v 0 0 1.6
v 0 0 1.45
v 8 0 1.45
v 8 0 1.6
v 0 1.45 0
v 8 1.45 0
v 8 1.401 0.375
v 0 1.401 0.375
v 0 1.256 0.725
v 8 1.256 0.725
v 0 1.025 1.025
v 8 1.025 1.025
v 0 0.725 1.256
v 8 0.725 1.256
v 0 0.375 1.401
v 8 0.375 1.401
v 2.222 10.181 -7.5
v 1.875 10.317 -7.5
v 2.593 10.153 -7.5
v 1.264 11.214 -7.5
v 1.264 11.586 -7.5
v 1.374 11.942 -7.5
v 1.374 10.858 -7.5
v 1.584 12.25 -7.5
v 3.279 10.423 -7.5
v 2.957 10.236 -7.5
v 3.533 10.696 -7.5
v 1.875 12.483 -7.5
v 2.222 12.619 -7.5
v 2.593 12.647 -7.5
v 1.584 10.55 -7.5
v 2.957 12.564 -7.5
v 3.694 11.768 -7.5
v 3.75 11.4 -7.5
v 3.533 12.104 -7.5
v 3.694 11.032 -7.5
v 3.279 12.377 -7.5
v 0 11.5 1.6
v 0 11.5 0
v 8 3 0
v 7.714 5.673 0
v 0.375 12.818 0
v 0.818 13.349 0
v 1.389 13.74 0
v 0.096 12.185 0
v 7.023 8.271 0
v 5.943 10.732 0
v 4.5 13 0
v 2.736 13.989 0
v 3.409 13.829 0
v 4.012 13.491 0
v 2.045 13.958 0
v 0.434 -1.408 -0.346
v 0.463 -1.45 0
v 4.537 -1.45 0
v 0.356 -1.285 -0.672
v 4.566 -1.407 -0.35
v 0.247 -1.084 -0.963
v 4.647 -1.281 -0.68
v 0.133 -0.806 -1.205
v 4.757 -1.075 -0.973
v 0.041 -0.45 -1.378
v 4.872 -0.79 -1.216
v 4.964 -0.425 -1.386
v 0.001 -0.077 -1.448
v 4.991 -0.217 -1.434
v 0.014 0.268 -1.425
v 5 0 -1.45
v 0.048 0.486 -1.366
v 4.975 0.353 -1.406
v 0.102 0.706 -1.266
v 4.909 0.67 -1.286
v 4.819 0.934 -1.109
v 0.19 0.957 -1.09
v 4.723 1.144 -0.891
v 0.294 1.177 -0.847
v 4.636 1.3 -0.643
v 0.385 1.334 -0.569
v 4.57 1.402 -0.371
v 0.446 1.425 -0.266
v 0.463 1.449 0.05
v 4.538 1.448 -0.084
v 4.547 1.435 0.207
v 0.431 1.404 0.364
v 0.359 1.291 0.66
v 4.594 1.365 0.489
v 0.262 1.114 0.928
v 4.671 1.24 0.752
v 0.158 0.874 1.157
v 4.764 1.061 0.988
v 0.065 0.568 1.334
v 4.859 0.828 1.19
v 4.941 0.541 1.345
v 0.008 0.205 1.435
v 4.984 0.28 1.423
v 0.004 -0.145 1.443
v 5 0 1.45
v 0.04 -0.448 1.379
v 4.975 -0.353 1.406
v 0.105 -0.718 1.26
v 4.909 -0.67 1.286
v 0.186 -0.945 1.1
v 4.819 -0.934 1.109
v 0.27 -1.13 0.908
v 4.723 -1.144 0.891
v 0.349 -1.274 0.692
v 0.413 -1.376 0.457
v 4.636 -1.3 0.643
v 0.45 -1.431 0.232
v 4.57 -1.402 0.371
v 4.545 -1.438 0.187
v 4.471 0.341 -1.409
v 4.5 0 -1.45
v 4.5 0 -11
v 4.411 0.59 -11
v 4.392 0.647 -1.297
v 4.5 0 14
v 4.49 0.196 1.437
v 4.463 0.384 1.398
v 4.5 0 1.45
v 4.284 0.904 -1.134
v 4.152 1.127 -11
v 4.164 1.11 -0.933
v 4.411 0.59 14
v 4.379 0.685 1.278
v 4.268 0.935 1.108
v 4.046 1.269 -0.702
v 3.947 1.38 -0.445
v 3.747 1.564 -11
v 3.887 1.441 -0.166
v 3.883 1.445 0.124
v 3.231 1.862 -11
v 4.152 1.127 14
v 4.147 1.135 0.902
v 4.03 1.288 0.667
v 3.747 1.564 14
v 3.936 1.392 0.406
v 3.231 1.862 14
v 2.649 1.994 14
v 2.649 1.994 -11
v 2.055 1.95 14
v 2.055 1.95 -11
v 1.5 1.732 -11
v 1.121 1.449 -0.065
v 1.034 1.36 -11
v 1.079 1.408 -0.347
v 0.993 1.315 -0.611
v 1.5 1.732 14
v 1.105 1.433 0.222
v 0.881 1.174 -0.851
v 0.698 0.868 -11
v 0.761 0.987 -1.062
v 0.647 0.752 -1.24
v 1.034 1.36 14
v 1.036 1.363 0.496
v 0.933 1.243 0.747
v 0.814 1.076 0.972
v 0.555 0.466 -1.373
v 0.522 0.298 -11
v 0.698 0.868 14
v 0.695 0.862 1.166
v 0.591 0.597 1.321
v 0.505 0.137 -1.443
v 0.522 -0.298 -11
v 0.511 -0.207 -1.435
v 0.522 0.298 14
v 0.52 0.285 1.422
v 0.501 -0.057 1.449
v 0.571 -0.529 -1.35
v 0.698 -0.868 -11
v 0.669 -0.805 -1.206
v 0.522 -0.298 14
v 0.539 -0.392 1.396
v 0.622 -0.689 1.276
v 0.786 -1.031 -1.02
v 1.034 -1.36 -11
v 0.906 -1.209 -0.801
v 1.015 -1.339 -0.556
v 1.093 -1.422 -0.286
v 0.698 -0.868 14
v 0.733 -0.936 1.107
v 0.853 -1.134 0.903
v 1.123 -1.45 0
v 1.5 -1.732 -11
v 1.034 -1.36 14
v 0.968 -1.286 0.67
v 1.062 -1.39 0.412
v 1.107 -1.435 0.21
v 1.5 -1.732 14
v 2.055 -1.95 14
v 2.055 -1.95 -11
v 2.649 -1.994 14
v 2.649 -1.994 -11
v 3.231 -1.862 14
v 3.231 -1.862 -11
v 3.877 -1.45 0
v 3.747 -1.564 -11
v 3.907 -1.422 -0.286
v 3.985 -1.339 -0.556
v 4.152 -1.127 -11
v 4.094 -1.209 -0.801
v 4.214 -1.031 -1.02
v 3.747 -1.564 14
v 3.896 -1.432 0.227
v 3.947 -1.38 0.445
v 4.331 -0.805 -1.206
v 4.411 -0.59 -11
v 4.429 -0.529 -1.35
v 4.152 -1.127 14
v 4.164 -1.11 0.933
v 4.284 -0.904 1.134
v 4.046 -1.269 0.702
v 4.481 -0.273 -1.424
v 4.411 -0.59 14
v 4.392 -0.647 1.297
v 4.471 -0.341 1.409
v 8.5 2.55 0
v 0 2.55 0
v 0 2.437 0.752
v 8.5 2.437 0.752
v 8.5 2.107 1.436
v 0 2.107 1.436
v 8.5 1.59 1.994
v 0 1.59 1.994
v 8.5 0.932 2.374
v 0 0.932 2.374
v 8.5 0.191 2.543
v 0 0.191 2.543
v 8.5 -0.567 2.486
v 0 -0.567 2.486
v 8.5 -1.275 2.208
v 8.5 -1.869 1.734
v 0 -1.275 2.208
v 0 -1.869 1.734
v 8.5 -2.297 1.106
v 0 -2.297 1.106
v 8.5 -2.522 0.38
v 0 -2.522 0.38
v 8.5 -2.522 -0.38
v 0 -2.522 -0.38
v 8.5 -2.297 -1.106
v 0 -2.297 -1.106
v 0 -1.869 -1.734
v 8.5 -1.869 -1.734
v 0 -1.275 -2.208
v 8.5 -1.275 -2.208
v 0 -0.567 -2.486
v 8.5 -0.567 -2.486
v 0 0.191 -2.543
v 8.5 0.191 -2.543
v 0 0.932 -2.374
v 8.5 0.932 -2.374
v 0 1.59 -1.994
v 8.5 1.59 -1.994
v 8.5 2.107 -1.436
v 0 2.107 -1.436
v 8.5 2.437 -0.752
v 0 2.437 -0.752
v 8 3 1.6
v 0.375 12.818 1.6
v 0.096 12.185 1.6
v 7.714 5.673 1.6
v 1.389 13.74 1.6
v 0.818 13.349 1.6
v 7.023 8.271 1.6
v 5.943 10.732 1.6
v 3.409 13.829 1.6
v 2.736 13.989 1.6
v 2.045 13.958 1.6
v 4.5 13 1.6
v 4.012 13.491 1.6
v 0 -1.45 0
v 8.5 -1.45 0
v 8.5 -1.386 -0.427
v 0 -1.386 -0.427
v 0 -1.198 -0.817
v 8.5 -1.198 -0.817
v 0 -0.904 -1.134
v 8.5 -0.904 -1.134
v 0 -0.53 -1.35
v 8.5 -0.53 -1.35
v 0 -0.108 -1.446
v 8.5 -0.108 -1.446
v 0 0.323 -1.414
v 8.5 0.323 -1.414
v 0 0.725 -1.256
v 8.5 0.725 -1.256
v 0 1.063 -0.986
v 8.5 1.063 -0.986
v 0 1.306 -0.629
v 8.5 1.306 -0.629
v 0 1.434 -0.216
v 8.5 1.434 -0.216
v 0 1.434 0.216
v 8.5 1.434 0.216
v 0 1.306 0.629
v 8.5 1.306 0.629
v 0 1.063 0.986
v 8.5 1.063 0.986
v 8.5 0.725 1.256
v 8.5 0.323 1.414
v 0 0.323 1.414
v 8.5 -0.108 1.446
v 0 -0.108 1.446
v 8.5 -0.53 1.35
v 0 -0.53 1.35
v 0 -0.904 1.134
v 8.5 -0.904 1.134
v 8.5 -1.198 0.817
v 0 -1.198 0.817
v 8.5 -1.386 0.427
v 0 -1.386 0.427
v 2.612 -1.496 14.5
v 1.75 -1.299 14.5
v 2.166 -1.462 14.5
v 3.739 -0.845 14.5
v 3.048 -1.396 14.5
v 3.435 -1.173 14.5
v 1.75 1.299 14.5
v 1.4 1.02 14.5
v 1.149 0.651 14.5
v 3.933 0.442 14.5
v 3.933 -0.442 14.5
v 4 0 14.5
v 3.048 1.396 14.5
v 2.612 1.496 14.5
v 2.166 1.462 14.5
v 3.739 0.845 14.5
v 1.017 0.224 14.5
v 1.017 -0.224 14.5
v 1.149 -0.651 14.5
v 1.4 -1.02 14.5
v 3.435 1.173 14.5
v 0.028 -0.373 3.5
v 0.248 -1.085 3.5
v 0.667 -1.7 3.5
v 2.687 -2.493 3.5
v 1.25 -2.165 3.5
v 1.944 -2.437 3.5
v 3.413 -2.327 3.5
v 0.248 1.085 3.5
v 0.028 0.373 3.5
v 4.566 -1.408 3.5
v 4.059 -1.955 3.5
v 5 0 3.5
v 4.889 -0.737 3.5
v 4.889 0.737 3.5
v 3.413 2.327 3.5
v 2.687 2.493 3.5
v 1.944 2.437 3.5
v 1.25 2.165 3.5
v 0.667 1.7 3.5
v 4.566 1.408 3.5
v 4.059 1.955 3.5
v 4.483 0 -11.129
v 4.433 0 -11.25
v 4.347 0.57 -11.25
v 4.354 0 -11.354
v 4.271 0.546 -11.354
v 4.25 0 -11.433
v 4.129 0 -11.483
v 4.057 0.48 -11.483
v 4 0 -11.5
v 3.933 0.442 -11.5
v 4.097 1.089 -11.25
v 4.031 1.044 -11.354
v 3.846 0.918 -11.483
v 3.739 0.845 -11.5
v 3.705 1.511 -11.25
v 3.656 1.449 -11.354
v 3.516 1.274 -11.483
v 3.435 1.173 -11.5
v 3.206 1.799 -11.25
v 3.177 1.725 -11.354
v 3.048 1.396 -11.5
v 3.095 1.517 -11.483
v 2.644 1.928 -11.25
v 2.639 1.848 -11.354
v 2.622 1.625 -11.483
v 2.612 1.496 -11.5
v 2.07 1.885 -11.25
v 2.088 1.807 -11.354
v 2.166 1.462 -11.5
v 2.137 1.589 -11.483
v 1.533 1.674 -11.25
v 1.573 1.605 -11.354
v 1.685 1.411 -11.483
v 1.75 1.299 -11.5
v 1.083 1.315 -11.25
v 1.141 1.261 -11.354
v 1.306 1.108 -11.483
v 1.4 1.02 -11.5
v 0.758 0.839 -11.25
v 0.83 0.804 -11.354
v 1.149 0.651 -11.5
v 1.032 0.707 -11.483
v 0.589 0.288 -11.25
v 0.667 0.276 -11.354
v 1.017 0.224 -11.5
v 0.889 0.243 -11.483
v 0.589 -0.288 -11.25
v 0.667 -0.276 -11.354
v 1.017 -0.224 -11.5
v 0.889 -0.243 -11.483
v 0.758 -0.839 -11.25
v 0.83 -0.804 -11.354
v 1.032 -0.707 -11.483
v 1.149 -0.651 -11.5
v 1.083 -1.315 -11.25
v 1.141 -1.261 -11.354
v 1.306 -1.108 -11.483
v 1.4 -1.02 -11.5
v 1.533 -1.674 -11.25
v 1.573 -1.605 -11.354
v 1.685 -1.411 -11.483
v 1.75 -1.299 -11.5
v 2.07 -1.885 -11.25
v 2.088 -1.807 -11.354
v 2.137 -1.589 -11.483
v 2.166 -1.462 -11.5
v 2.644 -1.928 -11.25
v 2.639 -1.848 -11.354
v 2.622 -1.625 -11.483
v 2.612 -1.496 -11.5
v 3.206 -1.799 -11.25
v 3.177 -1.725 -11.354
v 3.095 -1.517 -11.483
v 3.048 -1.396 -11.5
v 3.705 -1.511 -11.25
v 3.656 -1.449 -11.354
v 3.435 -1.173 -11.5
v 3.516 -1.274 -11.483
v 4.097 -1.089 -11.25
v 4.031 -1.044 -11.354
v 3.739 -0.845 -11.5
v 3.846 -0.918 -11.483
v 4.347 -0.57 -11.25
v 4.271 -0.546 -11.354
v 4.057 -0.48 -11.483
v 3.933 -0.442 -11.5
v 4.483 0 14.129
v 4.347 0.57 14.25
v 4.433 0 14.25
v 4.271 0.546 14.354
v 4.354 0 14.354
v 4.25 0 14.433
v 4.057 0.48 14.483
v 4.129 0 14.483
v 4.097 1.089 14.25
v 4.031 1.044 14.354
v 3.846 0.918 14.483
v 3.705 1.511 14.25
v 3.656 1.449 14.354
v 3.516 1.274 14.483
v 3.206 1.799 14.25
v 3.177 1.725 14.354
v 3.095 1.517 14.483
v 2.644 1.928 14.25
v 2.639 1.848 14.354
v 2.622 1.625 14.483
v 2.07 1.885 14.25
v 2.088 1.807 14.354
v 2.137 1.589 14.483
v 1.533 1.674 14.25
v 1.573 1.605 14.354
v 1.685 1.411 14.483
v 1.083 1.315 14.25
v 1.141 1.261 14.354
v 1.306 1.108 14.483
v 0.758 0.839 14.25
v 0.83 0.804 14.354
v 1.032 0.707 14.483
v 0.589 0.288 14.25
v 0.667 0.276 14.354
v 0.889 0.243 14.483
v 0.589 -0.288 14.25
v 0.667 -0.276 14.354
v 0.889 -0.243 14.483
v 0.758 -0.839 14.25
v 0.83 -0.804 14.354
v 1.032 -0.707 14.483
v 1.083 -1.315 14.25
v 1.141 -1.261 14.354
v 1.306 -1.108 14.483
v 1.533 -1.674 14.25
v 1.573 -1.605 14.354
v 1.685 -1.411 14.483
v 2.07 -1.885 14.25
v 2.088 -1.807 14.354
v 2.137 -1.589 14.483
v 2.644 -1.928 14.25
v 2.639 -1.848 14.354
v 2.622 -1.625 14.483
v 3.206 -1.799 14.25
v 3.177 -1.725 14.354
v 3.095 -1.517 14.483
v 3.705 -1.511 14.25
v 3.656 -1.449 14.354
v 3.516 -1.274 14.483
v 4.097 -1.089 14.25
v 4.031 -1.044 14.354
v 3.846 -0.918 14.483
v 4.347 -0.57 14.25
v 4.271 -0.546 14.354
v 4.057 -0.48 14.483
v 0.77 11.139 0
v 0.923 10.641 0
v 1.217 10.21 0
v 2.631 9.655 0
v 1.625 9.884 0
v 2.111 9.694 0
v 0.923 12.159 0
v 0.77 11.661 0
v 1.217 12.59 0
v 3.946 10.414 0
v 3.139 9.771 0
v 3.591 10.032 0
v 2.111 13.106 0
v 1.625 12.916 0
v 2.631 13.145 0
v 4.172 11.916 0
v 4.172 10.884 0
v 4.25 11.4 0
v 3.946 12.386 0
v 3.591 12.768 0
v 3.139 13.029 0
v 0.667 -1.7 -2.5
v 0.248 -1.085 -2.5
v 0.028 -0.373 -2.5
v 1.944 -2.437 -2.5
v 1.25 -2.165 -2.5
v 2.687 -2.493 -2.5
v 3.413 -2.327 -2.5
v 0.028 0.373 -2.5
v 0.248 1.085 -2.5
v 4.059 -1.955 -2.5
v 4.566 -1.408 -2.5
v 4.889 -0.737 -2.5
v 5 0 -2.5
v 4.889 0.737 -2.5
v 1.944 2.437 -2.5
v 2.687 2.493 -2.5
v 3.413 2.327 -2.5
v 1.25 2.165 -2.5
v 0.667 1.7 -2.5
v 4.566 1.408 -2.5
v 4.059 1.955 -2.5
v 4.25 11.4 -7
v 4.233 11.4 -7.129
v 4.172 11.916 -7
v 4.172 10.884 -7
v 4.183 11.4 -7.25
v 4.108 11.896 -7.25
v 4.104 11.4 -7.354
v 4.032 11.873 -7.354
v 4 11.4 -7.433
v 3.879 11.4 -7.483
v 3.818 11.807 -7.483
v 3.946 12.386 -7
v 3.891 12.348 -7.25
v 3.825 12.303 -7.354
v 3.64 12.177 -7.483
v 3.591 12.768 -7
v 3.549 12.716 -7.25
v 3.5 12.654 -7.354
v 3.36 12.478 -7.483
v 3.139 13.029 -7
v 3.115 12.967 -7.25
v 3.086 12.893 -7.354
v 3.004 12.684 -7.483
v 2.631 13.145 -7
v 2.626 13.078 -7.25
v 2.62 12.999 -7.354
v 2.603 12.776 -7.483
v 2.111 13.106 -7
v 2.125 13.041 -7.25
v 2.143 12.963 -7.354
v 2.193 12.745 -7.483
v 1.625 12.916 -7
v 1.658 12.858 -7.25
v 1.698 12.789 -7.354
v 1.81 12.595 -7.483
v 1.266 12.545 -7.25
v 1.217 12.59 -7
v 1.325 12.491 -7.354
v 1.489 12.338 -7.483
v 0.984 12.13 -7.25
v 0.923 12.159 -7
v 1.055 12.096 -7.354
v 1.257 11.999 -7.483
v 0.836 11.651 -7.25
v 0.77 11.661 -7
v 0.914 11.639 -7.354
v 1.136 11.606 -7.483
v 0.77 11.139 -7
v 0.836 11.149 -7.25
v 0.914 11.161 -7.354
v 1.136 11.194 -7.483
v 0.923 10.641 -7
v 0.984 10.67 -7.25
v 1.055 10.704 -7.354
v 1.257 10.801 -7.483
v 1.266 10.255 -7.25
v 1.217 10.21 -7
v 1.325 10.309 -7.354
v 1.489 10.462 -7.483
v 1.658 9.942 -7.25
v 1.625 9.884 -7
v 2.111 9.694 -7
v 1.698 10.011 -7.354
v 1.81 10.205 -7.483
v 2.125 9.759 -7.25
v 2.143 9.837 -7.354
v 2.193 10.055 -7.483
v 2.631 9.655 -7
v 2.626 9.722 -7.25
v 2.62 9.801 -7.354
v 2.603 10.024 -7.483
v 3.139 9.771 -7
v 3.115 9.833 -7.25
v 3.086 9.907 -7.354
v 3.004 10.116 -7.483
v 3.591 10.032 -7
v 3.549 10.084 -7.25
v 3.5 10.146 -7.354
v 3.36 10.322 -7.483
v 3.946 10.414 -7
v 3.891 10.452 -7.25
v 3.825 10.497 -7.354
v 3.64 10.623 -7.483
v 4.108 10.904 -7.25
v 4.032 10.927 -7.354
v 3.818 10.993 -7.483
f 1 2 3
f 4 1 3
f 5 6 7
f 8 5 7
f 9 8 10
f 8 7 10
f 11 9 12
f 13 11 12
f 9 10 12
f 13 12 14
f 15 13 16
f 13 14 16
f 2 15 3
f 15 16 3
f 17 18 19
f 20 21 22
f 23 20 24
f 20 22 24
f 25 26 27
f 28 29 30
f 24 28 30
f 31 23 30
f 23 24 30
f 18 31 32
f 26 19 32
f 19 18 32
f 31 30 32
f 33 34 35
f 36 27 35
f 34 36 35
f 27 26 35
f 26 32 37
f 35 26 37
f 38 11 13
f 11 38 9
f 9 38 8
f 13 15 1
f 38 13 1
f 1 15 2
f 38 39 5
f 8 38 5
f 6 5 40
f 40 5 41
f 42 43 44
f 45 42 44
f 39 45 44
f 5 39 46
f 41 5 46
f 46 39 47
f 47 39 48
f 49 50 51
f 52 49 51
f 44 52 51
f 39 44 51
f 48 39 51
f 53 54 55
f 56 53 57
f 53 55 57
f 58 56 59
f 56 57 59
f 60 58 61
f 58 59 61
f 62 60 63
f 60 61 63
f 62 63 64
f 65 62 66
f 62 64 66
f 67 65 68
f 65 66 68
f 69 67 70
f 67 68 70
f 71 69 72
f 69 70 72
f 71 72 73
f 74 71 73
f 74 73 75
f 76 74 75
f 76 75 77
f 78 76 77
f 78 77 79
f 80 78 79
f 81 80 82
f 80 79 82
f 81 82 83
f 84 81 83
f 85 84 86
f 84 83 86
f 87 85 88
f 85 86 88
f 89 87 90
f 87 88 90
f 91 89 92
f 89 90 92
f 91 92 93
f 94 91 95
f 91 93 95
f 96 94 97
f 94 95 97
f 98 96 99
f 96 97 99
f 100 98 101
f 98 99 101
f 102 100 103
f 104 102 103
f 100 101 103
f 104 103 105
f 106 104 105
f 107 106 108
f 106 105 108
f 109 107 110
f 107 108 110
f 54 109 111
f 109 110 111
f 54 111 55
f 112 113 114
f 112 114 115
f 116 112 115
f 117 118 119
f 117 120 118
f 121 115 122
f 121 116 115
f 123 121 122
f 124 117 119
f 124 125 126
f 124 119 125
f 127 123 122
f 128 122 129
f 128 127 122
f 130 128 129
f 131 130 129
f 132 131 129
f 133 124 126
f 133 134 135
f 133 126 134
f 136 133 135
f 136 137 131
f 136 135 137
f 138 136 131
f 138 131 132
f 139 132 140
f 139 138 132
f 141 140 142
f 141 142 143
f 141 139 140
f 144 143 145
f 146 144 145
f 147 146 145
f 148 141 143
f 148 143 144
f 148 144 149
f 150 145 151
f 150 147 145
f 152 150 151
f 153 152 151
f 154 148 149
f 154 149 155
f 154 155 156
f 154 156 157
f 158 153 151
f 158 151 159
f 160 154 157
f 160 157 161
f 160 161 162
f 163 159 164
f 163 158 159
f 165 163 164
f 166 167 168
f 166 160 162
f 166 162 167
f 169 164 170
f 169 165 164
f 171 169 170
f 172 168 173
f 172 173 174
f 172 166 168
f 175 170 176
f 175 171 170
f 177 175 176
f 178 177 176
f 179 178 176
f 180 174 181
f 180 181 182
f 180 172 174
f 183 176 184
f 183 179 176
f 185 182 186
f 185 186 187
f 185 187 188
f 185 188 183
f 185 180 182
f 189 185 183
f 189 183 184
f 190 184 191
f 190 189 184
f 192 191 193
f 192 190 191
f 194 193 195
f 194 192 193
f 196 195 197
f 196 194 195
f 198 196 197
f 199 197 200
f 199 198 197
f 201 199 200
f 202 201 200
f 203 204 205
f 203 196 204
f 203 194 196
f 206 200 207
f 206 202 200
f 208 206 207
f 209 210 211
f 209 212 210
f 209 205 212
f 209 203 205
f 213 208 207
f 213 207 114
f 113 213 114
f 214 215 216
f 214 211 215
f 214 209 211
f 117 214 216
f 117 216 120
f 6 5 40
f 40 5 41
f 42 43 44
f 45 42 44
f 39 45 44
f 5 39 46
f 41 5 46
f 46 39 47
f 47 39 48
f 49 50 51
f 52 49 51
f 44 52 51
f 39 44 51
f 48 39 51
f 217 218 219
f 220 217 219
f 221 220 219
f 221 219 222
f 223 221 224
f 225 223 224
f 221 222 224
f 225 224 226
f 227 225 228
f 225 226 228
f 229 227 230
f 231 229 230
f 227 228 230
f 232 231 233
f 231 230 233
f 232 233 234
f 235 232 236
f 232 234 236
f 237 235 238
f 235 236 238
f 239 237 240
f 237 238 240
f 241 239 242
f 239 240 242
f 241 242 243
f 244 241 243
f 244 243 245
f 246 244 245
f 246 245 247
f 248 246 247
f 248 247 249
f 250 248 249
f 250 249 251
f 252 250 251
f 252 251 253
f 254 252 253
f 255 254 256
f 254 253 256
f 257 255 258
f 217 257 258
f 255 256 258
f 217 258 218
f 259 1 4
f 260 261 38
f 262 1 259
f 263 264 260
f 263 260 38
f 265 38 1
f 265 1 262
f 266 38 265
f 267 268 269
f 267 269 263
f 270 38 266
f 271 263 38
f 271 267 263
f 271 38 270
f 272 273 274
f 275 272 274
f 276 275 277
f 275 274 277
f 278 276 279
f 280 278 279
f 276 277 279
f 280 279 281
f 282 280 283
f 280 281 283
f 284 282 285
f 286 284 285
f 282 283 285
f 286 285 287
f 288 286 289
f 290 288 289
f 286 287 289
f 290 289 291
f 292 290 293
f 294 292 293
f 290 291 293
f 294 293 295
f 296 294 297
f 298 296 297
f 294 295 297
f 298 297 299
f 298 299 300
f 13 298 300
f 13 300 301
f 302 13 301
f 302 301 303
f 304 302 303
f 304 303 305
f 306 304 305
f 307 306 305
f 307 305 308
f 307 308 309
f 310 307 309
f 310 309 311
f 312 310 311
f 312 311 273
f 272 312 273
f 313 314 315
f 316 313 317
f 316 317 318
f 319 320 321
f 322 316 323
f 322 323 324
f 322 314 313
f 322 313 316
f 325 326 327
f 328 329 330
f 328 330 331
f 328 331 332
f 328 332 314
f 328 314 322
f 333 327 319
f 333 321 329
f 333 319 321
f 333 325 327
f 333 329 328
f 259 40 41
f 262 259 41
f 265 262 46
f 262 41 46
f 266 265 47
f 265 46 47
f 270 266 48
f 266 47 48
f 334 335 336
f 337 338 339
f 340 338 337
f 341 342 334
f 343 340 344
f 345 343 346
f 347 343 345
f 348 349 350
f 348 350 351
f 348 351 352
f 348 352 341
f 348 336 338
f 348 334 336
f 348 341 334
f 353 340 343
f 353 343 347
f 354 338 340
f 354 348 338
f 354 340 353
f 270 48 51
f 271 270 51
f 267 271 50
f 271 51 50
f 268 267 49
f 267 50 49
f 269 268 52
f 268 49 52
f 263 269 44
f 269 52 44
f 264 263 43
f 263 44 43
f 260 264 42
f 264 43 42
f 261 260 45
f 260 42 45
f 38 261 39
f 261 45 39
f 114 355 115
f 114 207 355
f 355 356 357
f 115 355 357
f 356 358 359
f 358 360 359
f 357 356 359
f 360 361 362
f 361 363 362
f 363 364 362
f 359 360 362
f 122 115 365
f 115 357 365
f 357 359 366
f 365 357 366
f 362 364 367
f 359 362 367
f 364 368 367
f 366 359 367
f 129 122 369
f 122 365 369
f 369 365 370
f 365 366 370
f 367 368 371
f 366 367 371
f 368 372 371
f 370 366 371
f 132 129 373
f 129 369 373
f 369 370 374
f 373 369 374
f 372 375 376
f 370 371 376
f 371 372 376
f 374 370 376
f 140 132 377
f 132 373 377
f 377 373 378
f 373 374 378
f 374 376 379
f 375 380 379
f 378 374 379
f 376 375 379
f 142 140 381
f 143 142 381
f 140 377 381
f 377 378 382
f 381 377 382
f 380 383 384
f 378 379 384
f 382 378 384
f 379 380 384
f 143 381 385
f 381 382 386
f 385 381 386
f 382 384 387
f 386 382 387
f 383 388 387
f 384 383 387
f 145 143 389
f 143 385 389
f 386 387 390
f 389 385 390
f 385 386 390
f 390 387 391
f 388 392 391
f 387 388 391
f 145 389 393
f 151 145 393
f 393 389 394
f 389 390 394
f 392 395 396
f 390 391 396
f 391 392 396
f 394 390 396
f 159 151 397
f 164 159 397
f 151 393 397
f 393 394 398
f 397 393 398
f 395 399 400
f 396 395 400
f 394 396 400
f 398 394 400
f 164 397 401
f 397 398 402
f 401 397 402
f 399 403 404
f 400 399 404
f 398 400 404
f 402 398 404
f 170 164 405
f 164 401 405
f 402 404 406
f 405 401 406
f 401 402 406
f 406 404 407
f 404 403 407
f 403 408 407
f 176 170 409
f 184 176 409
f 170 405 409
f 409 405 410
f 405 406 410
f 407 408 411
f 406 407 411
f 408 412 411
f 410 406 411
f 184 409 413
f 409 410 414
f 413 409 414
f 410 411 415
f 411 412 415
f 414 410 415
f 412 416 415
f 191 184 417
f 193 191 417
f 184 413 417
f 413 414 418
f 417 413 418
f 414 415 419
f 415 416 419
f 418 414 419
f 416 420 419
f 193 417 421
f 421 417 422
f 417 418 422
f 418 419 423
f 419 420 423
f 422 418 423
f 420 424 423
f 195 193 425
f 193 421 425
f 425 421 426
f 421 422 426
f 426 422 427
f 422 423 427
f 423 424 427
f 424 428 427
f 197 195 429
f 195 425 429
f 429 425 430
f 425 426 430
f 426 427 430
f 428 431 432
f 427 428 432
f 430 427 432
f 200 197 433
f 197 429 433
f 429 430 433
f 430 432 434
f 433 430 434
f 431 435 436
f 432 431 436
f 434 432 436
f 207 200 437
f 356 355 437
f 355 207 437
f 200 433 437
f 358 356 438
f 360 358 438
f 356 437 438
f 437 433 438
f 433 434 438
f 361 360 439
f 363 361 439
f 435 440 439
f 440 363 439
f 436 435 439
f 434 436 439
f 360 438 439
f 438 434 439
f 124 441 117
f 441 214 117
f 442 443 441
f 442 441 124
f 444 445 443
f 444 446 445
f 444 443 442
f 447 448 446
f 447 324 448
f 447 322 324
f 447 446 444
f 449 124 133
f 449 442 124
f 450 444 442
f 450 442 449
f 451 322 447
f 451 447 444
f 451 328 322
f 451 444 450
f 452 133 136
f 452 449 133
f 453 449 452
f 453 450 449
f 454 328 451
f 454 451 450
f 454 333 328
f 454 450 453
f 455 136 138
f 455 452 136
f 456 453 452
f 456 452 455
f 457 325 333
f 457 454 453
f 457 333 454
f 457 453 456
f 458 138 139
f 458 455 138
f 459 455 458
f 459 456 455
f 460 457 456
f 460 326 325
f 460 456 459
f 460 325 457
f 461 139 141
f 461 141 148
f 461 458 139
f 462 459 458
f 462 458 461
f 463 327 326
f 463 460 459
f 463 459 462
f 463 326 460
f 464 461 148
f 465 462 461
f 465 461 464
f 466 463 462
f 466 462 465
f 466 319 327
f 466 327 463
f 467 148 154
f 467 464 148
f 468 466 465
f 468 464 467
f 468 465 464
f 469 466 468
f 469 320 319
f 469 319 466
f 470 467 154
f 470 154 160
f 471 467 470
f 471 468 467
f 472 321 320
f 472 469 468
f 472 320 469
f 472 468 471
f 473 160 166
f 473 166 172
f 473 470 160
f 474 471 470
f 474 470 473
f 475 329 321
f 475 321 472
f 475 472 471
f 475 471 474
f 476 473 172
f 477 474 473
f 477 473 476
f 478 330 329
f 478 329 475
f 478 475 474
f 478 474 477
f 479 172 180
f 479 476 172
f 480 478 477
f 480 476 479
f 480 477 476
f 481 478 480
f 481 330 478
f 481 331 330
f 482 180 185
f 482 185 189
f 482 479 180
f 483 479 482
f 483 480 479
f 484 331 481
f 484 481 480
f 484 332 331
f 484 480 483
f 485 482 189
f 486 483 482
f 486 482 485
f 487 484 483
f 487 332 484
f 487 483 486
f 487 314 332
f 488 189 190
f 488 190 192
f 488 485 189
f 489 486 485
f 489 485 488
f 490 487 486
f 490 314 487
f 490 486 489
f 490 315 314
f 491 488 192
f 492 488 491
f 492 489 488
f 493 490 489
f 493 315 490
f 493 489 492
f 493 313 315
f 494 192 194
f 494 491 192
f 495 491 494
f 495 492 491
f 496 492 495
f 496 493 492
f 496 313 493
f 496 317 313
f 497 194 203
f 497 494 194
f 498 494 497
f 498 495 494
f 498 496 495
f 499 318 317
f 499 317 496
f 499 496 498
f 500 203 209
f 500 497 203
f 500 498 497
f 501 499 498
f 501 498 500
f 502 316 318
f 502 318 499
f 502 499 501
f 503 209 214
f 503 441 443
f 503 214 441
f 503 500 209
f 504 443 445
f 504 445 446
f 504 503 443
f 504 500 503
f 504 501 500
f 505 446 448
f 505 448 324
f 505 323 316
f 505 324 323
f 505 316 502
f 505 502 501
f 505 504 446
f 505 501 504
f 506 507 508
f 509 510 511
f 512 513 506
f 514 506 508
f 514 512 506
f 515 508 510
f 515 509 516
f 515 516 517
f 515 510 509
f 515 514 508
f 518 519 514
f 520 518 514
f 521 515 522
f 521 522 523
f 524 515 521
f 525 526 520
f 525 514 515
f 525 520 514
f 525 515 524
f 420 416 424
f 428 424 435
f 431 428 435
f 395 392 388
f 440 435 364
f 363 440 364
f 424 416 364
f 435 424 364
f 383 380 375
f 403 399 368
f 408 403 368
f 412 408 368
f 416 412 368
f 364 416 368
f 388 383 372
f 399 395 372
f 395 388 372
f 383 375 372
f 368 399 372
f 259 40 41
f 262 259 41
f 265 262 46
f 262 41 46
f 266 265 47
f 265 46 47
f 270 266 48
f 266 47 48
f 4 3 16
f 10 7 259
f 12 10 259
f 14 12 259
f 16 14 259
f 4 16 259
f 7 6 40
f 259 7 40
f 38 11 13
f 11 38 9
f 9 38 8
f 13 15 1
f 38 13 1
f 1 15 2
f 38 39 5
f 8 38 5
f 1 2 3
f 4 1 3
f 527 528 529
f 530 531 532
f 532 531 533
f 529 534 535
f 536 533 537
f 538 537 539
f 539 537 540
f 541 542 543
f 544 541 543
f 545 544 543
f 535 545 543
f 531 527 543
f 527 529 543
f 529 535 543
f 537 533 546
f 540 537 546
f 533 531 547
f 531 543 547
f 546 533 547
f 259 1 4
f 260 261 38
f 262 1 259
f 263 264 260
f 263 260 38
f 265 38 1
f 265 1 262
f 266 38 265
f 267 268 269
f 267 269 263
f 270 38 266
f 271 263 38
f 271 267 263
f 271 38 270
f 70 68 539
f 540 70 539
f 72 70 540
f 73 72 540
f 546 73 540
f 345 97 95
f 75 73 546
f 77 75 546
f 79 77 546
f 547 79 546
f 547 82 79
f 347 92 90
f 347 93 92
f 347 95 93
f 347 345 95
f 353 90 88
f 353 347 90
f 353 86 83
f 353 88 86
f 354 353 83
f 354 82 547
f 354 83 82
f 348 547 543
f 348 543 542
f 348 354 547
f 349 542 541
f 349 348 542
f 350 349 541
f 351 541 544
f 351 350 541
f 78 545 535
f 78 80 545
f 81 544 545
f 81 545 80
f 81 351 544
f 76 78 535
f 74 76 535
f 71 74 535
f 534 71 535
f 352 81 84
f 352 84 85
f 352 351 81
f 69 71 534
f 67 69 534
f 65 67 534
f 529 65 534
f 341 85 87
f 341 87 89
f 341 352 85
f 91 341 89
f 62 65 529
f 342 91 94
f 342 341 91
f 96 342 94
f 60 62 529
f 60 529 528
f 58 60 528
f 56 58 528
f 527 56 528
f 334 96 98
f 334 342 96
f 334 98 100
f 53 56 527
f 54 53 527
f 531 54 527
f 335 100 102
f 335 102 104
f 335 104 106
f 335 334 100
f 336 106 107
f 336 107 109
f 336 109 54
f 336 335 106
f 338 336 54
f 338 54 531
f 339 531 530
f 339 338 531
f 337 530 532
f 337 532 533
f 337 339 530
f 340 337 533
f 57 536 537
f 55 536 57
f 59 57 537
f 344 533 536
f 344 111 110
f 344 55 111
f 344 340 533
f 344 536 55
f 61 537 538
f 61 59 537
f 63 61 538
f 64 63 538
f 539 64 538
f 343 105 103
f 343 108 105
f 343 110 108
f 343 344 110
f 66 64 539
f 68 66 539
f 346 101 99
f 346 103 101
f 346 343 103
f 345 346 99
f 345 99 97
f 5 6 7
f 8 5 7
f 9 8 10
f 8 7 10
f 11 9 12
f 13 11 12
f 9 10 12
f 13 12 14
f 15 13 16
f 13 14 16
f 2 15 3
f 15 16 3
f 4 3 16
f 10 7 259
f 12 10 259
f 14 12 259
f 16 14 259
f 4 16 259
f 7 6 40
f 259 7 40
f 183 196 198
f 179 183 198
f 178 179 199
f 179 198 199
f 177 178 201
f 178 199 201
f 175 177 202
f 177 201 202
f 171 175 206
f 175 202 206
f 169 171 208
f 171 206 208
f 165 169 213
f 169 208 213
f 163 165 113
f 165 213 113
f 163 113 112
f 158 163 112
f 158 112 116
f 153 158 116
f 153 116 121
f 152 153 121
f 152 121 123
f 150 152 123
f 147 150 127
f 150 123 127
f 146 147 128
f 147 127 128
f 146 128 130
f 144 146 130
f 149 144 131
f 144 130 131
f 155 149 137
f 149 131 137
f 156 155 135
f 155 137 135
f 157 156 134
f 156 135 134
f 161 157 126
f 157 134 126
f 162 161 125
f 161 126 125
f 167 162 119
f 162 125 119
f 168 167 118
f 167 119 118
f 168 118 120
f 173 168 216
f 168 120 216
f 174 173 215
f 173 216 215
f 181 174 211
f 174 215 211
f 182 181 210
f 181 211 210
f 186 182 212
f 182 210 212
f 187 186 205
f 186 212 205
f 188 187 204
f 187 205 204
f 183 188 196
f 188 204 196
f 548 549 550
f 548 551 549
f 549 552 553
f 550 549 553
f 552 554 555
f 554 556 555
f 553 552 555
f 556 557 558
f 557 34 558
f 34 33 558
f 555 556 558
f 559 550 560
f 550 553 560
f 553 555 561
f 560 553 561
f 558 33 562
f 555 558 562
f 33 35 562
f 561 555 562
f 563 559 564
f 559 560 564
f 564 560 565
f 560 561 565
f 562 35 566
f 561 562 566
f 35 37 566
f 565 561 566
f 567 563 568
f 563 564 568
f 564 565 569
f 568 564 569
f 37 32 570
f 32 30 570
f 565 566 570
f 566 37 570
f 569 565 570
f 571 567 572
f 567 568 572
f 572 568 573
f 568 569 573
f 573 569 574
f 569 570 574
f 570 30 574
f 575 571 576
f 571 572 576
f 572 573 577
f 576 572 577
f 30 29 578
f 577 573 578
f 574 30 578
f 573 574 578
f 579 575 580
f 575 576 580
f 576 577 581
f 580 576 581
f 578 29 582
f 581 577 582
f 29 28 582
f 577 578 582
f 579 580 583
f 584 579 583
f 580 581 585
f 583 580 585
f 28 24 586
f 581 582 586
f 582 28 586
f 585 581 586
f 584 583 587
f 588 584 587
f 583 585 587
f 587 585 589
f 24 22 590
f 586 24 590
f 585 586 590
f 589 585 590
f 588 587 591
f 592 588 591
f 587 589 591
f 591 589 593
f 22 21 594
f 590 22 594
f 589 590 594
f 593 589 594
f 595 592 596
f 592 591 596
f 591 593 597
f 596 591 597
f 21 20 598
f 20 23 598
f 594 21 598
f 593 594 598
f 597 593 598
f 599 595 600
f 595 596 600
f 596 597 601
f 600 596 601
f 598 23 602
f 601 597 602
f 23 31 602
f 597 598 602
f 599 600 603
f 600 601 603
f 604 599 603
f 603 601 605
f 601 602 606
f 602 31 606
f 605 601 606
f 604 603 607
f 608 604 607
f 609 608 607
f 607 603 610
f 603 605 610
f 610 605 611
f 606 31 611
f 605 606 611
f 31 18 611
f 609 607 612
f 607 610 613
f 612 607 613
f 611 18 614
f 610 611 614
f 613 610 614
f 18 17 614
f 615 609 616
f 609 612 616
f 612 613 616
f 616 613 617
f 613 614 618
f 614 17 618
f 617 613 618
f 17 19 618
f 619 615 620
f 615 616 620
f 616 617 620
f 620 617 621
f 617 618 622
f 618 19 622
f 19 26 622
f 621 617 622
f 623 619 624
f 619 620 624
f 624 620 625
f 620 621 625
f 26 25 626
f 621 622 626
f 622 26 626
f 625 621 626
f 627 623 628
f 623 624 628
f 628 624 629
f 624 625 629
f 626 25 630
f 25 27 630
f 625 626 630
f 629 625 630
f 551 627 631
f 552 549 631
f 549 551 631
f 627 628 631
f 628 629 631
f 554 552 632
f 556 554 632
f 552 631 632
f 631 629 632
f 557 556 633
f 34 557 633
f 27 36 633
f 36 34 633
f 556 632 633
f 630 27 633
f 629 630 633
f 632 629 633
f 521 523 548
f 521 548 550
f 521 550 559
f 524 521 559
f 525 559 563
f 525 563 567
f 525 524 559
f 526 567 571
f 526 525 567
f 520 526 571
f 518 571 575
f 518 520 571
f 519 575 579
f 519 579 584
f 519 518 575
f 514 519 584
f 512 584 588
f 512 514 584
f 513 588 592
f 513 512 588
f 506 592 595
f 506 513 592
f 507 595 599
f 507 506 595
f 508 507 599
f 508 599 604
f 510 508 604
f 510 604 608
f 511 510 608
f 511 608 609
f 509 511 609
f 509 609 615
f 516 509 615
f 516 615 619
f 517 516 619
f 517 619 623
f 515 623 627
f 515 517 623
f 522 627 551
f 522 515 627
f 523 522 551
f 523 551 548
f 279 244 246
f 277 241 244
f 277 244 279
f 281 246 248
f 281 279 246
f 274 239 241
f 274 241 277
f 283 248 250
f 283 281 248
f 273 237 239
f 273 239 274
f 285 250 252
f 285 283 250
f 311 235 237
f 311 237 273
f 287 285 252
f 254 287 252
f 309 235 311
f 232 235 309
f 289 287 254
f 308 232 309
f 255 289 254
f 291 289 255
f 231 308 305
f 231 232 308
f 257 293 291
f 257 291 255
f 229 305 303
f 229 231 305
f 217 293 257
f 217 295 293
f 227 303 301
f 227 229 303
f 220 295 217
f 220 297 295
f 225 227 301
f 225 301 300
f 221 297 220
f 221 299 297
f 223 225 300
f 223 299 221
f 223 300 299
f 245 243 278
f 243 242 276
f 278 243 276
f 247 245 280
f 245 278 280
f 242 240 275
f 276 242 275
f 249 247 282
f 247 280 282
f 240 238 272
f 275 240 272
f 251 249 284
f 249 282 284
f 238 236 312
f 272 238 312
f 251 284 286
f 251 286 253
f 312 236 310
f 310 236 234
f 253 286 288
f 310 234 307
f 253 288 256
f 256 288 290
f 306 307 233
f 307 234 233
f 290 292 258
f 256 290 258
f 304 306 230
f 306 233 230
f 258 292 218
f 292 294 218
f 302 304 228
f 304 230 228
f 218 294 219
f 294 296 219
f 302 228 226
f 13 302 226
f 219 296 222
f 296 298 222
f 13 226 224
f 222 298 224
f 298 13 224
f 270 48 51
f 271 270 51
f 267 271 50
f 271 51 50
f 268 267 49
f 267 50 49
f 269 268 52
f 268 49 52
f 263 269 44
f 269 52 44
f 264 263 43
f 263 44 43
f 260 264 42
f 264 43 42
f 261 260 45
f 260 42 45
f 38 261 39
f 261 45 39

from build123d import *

# Parameters (mm, degrees)
F0_R           = 2.55
F1_DEPTH       = 8.5
F3_DEPTH       = 1.6
F4_DEPTH       = 1.6
F5_R           = 1.75
F6_DEPTH       = 7.5
F7_R           = 2.5
F8_DEPTH       = 3.5
F8_DEPTH_BACK  = 2.5
F9_R           = 2
F10_DEPTH      = 14.5
F10_DEPTH_BACK = 11.5
F11_D          = 2.9
F11_2_D        = 2.9
F11_3_D        = 2.9
F11_4_D        = 2.9
F11_5_D        = 2.9
F12_R          = 0.5
F12_2_R        = 0.5


with BuildPart() as f1:
    # F0 (on Right) → F1 (new body)
    with BuildSketch(Plane.YZ):
        Circle(F0_R)
    extrude(amount=F1_DEPTH)

    # F11 (through all)
    with Locations(Plane(origin=(0, 0, 0), x_dir=(0, 1, 0), z_dir=(-1, 0, 0))):
        with Locations((0, 0)):
            Hole(F11_D / 2)


with BuildPart() as f3:
    # F2 (on Top) → F3 (new body)
    with BuildSketch(Plane.XY):
        with BuildLine():
            Line((0, 11.5), (0, 0))
            Line((0, 0), (8, 0))
            Line((8, 0), (8, 3))
            ThreePointArc((8, 3), (7.0231407035, 8.2705992462), (4.5, 13))
            ThreePointArc((4.5, 13), (1.709430585, 13.8717082451), (0, 11.5))
        make_face()
    extrude(amount=F3_DEPTH)

    # F11#2 (through all)
    with Locations(Plane(origin=(0, 0, 0), x_dir=(0, 1, 0), z_dir=(-1, 0, 0))):
        with Locations((0, 0)):
            Hole(F11_2_D / 2)


with BuildPart() as f4:
    # F2 (on Top) → F4 (new body)
    with BuildSketch(Plane.XY):
        with BuildLine():
            Line((0, 11.5), (0, 0))
            Line((0, 0), (8, 0))
            Line((8, 0), (8, 3))
            ThreePointArc((8, 3), (7.0231407035, 8.2705992462), (4.5, 13))
            ThreePointArc((4.5, 13), (1.709430585, 13.8717082451), (0, 11.5))
        make_face()
    extrude(amount=F4_DEPTH)

    # F11#3 (through all)
    with Locations(Plane(origin=(0, 0, 0), x_dir=(0, 1, 0), z_dir=(-1, 0, 0))):
        with Locations((0, 0)):
            Hole(F11_3_D / 2)


with BuildPart() as f6:
    # F5 (on Top) → F6 (new body)
    with BuildSketch(Plane.XY):
        with Locations((2.5, 11.4)):
            Circle(F5_R)
    extrude(amount=-F6_DEPTH)

    # F12#2
    f12_2_edges = [f6.edges().sort_by_distance(p)[0] for p in [
        (0.75, 11.4, -7.5),
    ]]
    fillet(f12_2_edges, radius=F12_2_R)


with BuildPart() as f8:
    # F7 (on Top) → F8 (new body, two sides)
    with BuildSketch(Plane.XY) as f8_sk:
        with Locations((2.5, 0)):
            Circle(F7_R)
    extrude(amount=F8_DEPTH)
    extrude(f8_sk.sketch, amount=-F8_DEPTH_BACK)

    # F11#4 (through all)
    with Locations(Plane(origin=(0, 0, 0), x_dir=(0, 1, 0), z_dir=(-1, 0, 0))):
        with Locations((0, 0)):
            Hole(F11_4_D / 2)


with BuildPart() as f10:
    # F9 (on Top) → F10 (new body, two sides)
    with BuildSketch(Plane.XY) as f10_sk:
        with Locations((2.5, 0)):
            Circle(F9_R)
    extrude(amount=F10_DEPTH)
    extrude(f10_sk.sketch, amount=-F10_DEPTH_BACK)

    # F11#5 (through all)
    with Locations(Plane(origin=(0, 0, 0), x_dir=(0, 1, 0), z_dir=(-1, 0, 0))):
        with Locations((0, 0)):
            Hole(F11_5_D / 2)

    # F12
    f12_edges = [f10.edges().sort_by_distance(p)[0] for p in [
        (0.5, 0, 14.5),
        (0.5, 0, -11.5),
    ]]
    fillet(f12_edges, radius=F12_R)


solid = Compound([f1.part, f3.part, f4.part, f6.part, f8.part, f10.part])
